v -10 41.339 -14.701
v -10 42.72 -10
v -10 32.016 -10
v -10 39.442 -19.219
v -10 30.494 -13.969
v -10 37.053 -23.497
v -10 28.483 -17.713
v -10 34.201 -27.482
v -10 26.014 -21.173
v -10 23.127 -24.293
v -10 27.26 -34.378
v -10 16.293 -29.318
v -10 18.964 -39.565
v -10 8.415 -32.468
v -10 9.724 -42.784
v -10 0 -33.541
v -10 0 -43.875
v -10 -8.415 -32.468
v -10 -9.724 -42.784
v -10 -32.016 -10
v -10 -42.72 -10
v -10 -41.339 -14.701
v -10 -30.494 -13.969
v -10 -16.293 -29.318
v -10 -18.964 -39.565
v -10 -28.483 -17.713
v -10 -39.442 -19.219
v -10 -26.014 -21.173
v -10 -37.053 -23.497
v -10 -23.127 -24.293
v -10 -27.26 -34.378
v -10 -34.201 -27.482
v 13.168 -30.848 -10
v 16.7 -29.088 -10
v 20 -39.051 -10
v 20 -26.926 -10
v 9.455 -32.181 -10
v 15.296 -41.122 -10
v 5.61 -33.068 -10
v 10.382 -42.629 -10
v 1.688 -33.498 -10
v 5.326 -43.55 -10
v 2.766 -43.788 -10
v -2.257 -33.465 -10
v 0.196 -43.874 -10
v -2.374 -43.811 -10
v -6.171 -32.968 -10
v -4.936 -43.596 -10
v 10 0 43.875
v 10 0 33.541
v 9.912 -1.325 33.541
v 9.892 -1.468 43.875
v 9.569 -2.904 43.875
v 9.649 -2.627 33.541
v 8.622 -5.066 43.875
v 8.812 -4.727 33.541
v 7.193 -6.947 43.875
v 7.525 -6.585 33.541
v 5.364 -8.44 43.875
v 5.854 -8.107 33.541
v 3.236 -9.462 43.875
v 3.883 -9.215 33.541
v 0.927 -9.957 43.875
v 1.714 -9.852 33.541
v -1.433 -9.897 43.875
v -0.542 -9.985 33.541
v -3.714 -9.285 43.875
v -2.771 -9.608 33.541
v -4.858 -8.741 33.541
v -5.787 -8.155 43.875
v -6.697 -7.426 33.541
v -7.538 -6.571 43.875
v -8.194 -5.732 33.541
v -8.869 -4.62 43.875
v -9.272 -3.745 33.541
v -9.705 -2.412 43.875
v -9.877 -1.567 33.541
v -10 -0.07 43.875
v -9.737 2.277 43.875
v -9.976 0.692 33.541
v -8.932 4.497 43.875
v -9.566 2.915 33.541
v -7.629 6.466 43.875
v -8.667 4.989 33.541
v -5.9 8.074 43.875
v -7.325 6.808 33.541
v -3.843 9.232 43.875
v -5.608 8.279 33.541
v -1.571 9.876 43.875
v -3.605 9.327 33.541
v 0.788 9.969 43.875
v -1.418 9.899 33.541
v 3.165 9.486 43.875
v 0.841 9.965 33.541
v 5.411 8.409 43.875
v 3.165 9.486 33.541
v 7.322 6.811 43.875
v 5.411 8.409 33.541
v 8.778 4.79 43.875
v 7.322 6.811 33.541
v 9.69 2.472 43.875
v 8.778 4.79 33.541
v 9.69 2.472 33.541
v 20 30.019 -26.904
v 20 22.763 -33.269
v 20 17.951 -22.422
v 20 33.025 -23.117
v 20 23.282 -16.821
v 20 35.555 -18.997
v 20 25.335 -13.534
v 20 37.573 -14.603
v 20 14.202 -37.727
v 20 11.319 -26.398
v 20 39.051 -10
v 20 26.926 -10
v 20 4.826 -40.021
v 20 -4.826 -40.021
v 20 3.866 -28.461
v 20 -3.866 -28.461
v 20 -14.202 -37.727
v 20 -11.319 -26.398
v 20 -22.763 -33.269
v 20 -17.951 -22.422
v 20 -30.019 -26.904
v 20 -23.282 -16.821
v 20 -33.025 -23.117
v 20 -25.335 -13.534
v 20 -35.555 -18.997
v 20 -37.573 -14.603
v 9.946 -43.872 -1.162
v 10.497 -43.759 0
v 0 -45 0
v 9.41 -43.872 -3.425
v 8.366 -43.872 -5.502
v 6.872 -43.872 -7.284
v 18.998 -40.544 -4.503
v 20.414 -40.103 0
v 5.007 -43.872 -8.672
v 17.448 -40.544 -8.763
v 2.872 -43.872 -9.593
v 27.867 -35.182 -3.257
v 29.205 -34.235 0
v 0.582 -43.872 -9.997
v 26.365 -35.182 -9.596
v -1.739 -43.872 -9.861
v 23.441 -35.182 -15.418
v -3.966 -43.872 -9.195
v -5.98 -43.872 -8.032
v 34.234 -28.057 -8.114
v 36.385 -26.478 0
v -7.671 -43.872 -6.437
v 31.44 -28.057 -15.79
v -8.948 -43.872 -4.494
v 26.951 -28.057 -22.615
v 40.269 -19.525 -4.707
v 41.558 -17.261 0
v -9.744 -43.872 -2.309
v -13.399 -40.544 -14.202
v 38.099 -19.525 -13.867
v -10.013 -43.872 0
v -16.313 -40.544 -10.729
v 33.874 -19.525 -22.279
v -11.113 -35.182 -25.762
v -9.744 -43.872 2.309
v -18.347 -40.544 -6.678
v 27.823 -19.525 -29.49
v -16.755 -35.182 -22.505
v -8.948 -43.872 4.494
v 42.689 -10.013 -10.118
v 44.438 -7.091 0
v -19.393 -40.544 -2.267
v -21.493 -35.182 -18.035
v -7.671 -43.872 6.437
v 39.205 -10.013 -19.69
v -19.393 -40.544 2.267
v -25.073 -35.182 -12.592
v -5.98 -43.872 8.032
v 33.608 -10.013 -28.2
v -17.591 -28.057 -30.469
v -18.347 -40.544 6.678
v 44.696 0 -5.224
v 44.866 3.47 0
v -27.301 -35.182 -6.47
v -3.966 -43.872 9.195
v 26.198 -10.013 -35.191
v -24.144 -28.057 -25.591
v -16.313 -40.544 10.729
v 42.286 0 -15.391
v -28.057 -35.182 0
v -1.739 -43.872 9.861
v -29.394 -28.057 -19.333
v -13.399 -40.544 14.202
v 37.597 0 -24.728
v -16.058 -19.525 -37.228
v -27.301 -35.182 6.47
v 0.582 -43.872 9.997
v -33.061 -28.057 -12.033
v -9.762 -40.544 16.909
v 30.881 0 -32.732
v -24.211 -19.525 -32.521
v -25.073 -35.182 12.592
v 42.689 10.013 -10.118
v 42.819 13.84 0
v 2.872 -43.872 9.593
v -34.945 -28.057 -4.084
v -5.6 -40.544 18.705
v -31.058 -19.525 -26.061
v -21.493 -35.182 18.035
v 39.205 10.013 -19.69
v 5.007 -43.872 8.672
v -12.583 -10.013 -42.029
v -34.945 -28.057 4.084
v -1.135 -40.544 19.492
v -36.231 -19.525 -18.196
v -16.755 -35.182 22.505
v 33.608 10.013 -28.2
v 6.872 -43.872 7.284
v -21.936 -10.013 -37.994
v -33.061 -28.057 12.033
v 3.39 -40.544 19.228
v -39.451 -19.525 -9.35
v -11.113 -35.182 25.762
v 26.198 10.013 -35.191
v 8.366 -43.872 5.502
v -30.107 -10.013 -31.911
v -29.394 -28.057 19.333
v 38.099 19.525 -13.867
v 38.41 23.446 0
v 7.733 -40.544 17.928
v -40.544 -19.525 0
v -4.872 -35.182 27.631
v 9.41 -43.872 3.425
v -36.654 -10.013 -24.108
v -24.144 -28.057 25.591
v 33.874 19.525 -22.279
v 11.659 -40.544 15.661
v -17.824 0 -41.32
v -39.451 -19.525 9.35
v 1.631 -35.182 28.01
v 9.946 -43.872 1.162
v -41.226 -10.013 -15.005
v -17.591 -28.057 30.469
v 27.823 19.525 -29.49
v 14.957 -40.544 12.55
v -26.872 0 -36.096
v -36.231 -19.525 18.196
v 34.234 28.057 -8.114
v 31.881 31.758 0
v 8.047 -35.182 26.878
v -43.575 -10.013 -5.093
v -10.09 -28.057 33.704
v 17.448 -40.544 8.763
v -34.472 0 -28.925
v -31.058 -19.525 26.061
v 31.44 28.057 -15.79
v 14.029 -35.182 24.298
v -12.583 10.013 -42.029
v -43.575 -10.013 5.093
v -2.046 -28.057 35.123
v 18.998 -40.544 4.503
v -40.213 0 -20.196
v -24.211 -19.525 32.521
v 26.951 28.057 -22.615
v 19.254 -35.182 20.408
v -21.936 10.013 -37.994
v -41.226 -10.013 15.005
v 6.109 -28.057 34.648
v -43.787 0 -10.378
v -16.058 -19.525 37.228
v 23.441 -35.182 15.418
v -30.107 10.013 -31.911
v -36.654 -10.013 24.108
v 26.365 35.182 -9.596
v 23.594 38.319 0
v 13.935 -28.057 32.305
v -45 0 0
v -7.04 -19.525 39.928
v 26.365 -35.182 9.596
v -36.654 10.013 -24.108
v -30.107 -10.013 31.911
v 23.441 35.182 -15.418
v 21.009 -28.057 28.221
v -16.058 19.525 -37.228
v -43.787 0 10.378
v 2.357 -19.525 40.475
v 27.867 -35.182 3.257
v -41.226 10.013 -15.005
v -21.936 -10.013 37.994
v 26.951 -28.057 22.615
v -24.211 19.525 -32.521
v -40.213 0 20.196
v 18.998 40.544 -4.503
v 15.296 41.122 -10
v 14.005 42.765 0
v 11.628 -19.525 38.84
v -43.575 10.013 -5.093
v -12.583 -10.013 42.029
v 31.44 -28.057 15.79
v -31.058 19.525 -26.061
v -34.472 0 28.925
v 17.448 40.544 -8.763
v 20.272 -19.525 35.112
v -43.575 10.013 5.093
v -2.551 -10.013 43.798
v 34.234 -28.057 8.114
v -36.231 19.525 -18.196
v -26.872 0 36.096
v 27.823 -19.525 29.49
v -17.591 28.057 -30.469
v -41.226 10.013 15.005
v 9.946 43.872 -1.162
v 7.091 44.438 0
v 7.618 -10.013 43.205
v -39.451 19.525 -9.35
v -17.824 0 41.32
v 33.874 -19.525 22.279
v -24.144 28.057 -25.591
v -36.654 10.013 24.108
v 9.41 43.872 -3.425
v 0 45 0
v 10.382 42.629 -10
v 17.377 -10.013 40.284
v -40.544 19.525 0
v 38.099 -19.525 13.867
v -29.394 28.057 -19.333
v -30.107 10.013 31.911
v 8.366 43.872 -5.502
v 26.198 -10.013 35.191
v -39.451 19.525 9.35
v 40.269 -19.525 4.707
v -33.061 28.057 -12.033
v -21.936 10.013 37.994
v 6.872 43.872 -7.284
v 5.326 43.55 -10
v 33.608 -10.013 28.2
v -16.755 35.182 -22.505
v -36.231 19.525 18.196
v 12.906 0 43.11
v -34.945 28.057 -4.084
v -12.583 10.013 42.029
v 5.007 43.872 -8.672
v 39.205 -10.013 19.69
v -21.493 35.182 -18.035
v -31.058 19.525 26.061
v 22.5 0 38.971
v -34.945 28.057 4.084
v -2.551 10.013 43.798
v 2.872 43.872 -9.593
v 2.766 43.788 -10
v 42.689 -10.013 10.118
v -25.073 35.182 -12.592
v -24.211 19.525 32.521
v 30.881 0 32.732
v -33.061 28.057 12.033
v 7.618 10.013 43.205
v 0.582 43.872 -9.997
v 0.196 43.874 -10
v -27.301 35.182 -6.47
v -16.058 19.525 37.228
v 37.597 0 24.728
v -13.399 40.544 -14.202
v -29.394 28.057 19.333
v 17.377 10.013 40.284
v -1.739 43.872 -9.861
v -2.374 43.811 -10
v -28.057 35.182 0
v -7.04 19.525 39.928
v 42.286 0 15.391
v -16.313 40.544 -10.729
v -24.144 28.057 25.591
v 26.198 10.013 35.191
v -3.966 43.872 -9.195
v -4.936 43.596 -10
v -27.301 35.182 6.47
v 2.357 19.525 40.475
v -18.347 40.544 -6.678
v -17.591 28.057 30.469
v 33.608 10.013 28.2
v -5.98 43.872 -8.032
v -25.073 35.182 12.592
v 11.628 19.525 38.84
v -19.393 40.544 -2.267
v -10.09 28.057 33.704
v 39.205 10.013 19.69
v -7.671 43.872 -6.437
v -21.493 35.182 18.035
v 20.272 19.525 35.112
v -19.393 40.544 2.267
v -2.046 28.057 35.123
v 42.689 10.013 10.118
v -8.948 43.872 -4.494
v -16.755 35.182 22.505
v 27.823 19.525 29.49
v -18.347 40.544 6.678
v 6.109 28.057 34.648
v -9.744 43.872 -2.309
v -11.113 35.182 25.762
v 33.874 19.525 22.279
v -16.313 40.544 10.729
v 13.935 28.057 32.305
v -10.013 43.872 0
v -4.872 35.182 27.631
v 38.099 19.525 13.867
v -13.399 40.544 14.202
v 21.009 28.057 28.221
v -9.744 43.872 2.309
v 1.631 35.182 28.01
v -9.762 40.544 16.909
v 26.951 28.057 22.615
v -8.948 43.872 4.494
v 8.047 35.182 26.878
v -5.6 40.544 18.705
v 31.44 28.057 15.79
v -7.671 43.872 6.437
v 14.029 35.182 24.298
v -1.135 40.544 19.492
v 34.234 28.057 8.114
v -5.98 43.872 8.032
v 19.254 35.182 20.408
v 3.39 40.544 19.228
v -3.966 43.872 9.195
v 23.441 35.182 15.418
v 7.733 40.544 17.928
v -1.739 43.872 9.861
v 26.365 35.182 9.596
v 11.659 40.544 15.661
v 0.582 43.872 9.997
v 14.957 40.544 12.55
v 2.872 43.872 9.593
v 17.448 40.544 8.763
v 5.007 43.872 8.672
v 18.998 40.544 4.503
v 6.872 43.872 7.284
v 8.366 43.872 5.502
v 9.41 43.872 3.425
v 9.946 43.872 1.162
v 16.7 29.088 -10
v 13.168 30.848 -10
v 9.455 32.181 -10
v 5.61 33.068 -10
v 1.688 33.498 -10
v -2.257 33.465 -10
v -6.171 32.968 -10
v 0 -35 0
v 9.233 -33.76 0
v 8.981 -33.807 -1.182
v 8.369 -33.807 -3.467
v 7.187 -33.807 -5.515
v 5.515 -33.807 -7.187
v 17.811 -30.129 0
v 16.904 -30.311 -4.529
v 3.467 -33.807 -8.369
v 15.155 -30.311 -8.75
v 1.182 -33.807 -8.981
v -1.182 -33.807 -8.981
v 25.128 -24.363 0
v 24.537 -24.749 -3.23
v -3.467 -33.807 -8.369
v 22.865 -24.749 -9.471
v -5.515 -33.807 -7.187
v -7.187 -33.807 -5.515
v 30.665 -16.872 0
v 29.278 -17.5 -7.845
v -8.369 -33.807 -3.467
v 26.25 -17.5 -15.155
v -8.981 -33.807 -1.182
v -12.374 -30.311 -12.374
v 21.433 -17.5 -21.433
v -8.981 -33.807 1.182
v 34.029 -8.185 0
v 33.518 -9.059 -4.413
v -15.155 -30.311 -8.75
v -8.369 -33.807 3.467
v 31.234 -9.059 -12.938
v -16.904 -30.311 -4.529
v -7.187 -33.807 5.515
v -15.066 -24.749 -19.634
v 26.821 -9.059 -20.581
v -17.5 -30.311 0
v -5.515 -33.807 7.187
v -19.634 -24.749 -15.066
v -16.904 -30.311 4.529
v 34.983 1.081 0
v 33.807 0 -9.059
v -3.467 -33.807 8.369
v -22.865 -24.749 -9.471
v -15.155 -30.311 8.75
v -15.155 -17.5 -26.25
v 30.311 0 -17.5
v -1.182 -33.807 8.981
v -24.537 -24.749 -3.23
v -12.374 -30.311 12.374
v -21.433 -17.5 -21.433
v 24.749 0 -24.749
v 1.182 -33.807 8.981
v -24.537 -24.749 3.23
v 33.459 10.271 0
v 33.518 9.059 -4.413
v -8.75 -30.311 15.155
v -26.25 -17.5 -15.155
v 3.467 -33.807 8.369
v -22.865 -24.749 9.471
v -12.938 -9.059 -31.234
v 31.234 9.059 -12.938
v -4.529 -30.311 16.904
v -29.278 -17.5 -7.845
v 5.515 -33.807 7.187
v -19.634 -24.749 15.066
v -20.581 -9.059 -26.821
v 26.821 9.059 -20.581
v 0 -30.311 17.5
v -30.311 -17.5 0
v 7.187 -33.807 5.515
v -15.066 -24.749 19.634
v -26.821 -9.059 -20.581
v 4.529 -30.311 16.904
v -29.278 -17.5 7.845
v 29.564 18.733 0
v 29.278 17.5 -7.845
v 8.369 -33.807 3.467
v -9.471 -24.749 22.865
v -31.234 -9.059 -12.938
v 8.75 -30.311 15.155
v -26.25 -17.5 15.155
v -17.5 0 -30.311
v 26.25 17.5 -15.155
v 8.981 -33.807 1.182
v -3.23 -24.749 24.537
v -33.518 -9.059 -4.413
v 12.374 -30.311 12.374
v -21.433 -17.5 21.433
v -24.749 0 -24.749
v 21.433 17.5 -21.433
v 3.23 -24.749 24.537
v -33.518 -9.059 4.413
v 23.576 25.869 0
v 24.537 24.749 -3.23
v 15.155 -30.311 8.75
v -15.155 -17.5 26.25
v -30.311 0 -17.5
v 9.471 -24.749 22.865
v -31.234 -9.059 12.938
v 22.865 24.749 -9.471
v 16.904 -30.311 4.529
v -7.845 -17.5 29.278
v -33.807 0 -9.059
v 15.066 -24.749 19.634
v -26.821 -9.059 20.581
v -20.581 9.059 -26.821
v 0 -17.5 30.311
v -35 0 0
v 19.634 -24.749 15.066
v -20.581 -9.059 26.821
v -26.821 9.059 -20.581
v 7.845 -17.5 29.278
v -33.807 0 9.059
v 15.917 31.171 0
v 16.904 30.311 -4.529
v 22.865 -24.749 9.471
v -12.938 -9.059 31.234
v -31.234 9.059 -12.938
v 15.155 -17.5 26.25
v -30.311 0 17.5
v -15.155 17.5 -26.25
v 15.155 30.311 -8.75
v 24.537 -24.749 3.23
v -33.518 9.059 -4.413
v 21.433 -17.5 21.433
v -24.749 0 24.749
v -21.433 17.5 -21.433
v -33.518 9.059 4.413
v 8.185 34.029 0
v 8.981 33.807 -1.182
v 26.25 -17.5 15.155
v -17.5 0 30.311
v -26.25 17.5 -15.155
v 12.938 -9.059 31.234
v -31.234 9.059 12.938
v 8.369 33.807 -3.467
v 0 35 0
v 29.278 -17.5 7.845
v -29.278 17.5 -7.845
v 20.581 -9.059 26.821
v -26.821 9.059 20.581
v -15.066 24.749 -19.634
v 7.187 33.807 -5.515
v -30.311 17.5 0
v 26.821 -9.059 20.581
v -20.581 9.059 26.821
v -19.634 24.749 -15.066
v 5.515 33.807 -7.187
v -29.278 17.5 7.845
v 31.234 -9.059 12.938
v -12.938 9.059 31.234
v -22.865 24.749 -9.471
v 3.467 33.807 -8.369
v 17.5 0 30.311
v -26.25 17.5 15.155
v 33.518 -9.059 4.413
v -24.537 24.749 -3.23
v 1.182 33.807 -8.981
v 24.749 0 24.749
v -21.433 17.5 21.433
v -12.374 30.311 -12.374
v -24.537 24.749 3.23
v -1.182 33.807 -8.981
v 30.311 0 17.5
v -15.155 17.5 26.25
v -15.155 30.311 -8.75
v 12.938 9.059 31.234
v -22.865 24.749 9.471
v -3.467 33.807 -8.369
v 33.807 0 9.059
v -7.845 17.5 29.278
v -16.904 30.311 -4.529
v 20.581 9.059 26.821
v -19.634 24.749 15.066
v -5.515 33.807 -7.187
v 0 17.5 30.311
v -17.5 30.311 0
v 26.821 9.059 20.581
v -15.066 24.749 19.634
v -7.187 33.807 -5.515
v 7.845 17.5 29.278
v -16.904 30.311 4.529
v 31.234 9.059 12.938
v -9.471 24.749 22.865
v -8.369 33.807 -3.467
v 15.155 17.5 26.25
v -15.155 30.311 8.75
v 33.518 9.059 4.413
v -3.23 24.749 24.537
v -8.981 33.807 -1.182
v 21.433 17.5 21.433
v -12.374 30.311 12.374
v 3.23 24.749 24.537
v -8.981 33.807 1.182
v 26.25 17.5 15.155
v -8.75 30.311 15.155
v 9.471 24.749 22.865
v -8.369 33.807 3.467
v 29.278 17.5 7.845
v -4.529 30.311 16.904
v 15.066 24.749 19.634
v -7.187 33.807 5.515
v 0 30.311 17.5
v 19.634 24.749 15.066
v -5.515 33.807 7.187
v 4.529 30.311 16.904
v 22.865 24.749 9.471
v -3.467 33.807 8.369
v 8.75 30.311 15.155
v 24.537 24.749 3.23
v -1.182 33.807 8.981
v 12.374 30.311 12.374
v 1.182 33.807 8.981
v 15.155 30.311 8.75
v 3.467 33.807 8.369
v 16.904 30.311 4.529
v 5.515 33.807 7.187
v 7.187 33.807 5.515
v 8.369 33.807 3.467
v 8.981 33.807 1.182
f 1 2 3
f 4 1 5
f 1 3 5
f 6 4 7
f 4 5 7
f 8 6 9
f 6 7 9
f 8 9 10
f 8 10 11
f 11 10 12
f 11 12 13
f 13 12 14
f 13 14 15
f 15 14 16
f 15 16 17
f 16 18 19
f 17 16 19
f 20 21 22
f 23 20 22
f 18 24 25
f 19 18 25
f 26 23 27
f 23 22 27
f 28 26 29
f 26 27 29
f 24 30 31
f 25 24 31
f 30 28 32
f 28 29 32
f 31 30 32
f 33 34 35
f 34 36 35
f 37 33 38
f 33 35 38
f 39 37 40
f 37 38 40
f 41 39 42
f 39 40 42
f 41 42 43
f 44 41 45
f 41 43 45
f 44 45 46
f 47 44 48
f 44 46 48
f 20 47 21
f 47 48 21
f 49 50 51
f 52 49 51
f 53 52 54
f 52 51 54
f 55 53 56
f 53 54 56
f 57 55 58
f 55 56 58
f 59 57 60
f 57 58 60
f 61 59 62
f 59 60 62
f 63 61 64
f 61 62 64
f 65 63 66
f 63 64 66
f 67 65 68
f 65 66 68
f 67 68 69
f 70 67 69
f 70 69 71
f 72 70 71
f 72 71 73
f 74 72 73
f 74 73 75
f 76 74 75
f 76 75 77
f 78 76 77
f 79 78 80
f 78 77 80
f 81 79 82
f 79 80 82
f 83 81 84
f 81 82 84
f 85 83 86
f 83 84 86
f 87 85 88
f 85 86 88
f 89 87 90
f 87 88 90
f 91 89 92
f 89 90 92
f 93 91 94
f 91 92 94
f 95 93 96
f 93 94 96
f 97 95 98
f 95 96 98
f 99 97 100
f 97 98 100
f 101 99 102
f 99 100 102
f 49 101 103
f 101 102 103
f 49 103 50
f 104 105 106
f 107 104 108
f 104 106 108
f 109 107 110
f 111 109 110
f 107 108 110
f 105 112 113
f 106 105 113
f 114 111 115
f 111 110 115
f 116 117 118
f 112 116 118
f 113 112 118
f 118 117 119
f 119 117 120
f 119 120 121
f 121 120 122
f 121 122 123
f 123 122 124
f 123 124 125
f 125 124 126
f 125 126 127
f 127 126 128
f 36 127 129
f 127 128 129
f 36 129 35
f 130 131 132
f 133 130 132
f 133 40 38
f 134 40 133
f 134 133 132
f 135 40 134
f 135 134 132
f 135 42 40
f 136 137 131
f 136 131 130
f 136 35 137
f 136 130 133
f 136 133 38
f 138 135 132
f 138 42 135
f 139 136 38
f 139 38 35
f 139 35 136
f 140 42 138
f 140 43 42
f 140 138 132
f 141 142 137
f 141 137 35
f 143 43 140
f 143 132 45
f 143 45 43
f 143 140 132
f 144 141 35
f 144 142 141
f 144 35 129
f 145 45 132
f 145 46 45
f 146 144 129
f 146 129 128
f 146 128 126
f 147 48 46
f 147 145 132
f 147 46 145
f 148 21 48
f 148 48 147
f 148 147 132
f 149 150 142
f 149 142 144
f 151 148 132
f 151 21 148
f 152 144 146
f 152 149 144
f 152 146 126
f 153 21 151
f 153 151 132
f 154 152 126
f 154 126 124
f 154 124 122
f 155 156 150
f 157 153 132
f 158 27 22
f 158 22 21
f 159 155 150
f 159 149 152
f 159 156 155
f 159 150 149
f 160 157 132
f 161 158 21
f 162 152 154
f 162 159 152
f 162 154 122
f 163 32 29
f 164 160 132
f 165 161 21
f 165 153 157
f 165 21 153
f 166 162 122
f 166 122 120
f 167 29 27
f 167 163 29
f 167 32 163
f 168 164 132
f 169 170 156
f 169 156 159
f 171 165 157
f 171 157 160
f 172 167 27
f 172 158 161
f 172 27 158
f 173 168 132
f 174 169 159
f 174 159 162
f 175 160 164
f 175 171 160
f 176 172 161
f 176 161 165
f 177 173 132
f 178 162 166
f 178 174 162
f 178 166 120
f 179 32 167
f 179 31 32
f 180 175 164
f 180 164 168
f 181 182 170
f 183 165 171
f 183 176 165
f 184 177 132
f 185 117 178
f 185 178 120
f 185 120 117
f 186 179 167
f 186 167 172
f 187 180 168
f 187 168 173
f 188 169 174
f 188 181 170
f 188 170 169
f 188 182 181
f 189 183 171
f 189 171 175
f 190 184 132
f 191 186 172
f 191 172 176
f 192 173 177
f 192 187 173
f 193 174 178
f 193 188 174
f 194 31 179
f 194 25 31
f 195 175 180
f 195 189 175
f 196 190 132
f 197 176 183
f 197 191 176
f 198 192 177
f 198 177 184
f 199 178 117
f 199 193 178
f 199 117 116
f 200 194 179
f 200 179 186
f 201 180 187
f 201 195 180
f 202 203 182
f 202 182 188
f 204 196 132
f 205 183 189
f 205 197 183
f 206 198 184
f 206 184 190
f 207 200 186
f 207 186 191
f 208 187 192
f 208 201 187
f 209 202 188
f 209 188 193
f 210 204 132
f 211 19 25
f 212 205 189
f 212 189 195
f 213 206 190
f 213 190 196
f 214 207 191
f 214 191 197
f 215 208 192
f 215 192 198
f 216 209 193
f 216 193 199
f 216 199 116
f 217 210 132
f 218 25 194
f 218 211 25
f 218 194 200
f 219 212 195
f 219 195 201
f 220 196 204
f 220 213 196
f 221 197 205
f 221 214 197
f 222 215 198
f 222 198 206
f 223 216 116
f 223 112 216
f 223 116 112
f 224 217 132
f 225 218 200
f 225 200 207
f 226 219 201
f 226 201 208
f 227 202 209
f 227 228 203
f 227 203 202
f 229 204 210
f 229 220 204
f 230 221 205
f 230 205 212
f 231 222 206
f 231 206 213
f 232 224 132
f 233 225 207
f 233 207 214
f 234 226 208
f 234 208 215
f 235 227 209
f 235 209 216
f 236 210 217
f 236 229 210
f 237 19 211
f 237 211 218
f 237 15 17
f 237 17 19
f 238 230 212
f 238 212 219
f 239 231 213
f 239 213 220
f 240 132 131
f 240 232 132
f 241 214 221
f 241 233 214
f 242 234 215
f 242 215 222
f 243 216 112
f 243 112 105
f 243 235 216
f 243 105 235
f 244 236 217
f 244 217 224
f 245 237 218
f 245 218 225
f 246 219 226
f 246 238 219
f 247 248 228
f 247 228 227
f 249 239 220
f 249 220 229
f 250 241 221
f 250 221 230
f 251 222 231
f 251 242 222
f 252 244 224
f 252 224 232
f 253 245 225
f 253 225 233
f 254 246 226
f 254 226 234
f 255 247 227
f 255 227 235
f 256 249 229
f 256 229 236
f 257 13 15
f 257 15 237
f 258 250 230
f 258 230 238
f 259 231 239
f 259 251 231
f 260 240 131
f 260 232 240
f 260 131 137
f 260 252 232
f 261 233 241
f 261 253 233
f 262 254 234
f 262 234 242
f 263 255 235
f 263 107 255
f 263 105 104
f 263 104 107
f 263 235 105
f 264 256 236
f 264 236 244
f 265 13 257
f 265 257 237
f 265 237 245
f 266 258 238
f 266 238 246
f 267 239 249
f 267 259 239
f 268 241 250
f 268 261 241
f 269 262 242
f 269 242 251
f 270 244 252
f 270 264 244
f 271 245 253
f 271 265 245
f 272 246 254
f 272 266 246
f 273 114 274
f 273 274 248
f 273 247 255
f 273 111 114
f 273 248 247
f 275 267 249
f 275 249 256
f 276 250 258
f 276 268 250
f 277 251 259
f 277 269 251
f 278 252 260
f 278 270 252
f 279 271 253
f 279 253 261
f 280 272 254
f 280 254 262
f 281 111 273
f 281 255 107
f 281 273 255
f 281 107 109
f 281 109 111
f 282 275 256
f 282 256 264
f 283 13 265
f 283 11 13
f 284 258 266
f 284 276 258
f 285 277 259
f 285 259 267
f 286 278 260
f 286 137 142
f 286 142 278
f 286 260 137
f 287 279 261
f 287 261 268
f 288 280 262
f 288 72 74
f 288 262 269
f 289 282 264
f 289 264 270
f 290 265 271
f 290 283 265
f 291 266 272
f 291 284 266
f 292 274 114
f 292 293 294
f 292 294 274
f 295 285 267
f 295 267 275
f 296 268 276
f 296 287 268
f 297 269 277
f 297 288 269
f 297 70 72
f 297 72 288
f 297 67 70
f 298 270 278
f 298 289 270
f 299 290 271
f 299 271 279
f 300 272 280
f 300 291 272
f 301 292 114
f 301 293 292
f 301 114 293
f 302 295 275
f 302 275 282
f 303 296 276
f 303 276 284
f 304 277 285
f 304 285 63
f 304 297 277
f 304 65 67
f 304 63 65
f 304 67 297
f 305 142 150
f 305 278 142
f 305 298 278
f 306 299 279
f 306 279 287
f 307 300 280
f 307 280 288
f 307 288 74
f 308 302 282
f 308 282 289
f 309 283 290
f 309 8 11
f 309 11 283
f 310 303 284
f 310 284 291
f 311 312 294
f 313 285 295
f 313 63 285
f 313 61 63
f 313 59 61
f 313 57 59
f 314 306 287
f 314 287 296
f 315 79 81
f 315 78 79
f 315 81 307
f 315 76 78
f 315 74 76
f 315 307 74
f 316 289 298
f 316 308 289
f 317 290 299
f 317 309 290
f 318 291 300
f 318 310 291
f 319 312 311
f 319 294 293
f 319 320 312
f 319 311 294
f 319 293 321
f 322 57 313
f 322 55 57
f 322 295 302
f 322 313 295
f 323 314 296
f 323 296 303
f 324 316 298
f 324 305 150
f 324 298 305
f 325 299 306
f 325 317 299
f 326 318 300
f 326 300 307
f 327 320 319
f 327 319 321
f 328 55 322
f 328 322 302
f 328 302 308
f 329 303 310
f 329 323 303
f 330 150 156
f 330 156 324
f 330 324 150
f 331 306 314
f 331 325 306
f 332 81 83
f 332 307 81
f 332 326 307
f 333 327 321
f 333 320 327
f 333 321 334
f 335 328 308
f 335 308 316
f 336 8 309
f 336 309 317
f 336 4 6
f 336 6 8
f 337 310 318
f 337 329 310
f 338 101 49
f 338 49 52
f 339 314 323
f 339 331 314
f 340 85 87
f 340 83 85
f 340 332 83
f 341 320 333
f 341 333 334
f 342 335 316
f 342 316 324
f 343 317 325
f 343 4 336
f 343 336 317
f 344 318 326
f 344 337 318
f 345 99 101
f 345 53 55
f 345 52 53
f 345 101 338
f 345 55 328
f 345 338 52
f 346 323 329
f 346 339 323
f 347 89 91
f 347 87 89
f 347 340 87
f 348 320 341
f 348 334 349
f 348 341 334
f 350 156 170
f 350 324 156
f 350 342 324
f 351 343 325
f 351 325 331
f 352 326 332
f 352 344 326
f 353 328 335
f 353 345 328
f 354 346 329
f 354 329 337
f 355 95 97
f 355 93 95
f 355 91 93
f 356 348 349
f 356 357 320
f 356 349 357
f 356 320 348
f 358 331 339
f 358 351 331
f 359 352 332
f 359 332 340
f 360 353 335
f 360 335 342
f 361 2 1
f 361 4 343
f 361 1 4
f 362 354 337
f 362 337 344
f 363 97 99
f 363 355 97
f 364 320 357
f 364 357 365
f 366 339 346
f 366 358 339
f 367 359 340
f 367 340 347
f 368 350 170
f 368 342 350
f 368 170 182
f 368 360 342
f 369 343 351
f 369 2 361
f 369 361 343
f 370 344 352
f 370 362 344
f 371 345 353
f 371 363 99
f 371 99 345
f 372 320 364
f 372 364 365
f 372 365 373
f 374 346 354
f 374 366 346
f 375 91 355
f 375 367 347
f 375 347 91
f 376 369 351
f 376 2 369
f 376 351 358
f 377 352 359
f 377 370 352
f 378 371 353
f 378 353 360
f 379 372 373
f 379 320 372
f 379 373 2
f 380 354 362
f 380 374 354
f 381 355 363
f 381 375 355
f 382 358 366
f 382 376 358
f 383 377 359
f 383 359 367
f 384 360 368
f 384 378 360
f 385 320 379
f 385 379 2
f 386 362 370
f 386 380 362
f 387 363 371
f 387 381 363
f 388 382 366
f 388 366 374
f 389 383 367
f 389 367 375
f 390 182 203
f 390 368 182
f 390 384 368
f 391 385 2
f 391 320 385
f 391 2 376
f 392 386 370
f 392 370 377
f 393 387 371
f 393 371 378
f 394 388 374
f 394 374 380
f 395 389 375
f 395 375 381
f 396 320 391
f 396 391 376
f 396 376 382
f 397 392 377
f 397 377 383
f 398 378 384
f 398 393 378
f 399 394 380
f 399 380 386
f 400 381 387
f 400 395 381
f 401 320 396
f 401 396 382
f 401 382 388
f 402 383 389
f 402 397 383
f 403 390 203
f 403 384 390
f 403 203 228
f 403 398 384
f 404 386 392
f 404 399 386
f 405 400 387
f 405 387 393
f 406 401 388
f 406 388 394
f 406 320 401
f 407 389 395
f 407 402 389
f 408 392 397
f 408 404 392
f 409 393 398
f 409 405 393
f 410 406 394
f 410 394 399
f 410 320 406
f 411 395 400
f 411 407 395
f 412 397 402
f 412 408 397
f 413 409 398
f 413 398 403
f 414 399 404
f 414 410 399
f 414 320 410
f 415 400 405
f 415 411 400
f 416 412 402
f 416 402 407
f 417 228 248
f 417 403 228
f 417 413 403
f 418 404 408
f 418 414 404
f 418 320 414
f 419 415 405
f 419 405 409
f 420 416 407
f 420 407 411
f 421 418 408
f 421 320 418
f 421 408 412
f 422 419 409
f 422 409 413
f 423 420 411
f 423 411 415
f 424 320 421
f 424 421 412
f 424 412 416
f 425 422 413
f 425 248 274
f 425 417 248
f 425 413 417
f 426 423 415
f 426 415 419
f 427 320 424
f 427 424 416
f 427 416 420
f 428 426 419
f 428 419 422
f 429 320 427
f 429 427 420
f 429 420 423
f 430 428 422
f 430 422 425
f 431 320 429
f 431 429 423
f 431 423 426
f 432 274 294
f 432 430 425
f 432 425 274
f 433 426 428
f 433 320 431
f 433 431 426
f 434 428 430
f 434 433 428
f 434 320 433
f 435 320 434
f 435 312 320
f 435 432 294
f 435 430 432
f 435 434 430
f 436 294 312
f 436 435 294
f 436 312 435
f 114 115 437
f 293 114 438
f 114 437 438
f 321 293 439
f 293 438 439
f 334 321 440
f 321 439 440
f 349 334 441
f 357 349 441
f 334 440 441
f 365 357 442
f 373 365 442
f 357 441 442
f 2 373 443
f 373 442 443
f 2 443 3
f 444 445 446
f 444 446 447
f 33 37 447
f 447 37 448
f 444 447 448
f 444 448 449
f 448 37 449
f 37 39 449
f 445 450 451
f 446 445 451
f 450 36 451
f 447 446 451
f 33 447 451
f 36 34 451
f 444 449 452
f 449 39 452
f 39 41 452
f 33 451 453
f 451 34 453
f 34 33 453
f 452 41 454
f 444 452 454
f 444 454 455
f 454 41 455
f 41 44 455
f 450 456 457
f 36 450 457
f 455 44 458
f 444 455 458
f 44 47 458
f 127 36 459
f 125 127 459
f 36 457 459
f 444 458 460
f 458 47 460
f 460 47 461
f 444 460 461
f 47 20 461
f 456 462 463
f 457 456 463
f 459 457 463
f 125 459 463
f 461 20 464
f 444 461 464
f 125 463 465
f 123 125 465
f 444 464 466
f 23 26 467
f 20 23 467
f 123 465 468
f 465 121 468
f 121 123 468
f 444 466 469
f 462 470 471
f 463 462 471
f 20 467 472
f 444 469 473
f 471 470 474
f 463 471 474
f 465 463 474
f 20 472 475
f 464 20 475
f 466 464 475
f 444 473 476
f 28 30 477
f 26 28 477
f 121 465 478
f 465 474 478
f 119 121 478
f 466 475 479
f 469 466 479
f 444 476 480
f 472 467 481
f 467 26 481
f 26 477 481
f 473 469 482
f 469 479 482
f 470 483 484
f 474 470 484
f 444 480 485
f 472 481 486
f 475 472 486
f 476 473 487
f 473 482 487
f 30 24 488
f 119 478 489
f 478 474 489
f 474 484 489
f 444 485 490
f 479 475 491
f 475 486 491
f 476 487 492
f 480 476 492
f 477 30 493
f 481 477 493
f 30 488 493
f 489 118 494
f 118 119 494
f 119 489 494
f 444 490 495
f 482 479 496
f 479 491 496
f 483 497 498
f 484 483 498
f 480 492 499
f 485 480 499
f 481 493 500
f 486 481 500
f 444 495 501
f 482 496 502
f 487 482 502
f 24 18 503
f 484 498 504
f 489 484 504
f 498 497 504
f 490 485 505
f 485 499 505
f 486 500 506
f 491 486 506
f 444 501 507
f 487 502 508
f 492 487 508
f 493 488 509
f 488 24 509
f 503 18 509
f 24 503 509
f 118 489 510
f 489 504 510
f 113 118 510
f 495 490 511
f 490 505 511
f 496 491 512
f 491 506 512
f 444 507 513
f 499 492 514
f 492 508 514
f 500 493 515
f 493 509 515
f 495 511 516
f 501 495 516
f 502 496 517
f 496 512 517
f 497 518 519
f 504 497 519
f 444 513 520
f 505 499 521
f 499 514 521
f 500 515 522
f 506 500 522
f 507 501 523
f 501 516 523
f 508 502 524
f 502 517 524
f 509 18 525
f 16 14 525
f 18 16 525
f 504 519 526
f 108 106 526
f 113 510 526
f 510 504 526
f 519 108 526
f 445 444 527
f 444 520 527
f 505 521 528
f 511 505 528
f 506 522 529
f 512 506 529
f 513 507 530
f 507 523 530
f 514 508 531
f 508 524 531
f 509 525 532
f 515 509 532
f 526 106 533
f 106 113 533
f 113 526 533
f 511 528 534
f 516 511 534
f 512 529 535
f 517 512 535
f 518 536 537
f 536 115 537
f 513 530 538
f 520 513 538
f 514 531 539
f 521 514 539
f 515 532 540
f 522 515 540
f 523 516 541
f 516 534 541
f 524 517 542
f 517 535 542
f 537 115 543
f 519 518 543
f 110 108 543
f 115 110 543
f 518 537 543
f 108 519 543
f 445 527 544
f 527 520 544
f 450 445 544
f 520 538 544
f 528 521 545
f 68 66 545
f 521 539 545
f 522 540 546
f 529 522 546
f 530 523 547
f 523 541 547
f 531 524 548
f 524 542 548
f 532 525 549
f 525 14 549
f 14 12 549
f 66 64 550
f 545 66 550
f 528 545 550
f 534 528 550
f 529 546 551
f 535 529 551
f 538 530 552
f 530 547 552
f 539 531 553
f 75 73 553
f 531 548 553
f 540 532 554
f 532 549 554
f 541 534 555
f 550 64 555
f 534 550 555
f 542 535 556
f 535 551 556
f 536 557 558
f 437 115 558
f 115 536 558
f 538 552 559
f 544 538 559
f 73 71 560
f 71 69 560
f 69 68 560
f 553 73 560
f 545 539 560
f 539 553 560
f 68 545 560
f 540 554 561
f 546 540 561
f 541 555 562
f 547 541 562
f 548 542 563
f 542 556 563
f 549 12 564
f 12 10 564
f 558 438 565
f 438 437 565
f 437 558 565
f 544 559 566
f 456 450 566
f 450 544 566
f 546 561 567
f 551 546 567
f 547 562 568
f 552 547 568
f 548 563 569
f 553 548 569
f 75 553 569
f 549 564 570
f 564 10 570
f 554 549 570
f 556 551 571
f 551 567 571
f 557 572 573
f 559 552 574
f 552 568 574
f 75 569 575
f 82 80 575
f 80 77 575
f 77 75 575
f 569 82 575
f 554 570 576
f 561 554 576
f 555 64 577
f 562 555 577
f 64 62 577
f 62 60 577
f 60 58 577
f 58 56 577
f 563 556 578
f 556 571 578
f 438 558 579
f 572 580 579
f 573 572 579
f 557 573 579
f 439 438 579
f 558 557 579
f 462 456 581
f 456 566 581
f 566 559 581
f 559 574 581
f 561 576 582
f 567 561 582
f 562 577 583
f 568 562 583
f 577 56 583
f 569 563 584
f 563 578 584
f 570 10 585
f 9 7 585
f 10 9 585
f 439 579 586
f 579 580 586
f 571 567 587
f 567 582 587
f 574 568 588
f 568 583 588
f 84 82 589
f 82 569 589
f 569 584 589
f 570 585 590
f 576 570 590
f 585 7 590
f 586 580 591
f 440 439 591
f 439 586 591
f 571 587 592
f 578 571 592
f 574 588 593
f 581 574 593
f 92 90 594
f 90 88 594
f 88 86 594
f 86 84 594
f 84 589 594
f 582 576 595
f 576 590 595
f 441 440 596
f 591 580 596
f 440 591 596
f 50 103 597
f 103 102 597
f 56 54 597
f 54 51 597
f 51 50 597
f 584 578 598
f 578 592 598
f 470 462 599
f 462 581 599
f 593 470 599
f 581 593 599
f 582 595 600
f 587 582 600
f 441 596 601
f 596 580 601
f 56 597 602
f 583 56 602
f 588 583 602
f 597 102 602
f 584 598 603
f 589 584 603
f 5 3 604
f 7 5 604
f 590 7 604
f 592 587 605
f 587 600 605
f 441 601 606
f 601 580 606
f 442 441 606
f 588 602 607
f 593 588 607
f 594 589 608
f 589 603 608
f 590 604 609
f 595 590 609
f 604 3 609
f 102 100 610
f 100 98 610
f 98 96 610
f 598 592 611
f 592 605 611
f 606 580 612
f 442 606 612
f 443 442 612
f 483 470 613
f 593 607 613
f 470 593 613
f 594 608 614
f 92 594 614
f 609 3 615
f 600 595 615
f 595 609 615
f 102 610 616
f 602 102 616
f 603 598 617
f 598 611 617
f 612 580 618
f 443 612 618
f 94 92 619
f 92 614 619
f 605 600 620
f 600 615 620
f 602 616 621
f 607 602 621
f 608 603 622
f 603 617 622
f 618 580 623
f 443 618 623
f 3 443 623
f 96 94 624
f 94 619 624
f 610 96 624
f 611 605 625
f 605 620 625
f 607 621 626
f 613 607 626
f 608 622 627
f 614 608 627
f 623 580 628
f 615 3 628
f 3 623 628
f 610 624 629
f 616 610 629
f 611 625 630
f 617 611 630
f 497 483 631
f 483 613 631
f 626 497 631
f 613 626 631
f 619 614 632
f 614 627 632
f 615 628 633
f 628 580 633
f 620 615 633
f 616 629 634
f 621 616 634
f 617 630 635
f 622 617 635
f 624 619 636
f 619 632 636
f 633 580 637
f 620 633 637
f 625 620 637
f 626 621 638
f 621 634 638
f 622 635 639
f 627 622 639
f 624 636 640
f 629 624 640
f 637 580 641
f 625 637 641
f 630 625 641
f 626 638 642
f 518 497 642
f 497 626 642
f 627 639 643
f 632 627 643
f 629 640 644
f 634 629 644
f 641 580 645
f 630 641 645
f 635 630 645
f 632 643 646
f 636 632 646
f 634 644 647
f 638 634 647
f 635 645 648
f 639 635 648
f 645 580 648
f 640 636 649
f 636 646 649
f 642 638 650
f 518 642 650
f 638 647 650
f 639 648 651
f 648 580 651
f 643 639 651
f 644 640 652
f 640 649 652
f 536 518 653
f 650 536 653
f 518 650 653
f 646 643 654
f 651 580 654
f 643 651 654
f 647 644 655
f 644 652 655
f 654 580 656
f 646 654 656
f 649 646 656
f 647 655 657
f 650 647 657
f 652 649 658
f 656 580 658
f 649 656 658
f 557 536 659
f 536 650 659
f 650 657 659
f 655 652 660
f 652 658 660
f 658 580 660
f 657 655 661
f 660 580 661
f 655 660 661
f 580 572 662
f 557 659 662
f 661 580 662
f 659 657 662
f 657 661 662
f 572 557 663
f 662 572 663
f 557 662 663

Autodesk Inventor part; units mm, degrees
ref_plane "YZ Plane" through (0, 0, 0) normal (1, 0, 0) x (0, 1, 0)
ref_plane "XZ Plane" through (0, 0, 0) normal (0, 1, 0) x (-1, 0, 0)
ref_plane "XY Plane" through (0, 0, 0) normal (0, 0, 1) x (1, 0, 0)
sketch "Эскиз1" plane through (0, 0, 0) normal (0, 0, 1) x (1, 0, 0)
  arc A0 (0, -35) -> (0, 35) centre (0, 0) ccw
  arc A1 (0, -45) -> (0, 45) centre (0, 0) ccw
  line L0 (0, 45) -> (0, 35)
  line L1 (0, -45) -> (0, -35)
  line L2 (0, -63) -> (0, 63) projected
  dimension "d0" = 35
  dimension "d1" = 45
revolve "Вращение1" add sketch "Эскиз1" angle 360 about axis through (0, -10, 0) along (0, 1, 0) contours A0 L0 A1 L1
sketch "Эскиз2" plane through (0, 0, 0) normal (0, 0, 1) x (1, 0, 0)
  circle A0 centre (0, 0) radius 10
  dimension "d3" = 20
extrude "Выдавливание1" cut sketch "Эскиз2" along normal through all
sketch "Эскиз3" plane through (0, 0, 0) normal (0, 1, 0) x (-1, 0, 0)
  line L0 (10, -45) -> (-20, -45)
  line L1 (-20, -45) -> (-20, -10)
  line L2 (-20, -10) -> (10, -10)
  line L3 (10, -10) -> (10, -45)
  line L4 (-10, 43.8748) -> (10, 43.8748) projected
  line L5 (-10, 43.8748) -> (10, 43.8748) projected
  arc A0 (-10, 43.8748) -> (10, 43.8748) centre (0, 0) ccw projected
  arc A1 (-10, 43.8748) -> (10, 43.8748) centre (0, 0) ccw projected
  dimension "d6" = 30
  dimension "d7" = 10
  dimension "d8" = 10
extrude "Выдавливание2" cut sketch "Эскиз3" along normal through all both and the other way through all contours L0 A0 L3 | L0 L1 A0 | A0 L1 L2 L3
properties part number "Нар"
